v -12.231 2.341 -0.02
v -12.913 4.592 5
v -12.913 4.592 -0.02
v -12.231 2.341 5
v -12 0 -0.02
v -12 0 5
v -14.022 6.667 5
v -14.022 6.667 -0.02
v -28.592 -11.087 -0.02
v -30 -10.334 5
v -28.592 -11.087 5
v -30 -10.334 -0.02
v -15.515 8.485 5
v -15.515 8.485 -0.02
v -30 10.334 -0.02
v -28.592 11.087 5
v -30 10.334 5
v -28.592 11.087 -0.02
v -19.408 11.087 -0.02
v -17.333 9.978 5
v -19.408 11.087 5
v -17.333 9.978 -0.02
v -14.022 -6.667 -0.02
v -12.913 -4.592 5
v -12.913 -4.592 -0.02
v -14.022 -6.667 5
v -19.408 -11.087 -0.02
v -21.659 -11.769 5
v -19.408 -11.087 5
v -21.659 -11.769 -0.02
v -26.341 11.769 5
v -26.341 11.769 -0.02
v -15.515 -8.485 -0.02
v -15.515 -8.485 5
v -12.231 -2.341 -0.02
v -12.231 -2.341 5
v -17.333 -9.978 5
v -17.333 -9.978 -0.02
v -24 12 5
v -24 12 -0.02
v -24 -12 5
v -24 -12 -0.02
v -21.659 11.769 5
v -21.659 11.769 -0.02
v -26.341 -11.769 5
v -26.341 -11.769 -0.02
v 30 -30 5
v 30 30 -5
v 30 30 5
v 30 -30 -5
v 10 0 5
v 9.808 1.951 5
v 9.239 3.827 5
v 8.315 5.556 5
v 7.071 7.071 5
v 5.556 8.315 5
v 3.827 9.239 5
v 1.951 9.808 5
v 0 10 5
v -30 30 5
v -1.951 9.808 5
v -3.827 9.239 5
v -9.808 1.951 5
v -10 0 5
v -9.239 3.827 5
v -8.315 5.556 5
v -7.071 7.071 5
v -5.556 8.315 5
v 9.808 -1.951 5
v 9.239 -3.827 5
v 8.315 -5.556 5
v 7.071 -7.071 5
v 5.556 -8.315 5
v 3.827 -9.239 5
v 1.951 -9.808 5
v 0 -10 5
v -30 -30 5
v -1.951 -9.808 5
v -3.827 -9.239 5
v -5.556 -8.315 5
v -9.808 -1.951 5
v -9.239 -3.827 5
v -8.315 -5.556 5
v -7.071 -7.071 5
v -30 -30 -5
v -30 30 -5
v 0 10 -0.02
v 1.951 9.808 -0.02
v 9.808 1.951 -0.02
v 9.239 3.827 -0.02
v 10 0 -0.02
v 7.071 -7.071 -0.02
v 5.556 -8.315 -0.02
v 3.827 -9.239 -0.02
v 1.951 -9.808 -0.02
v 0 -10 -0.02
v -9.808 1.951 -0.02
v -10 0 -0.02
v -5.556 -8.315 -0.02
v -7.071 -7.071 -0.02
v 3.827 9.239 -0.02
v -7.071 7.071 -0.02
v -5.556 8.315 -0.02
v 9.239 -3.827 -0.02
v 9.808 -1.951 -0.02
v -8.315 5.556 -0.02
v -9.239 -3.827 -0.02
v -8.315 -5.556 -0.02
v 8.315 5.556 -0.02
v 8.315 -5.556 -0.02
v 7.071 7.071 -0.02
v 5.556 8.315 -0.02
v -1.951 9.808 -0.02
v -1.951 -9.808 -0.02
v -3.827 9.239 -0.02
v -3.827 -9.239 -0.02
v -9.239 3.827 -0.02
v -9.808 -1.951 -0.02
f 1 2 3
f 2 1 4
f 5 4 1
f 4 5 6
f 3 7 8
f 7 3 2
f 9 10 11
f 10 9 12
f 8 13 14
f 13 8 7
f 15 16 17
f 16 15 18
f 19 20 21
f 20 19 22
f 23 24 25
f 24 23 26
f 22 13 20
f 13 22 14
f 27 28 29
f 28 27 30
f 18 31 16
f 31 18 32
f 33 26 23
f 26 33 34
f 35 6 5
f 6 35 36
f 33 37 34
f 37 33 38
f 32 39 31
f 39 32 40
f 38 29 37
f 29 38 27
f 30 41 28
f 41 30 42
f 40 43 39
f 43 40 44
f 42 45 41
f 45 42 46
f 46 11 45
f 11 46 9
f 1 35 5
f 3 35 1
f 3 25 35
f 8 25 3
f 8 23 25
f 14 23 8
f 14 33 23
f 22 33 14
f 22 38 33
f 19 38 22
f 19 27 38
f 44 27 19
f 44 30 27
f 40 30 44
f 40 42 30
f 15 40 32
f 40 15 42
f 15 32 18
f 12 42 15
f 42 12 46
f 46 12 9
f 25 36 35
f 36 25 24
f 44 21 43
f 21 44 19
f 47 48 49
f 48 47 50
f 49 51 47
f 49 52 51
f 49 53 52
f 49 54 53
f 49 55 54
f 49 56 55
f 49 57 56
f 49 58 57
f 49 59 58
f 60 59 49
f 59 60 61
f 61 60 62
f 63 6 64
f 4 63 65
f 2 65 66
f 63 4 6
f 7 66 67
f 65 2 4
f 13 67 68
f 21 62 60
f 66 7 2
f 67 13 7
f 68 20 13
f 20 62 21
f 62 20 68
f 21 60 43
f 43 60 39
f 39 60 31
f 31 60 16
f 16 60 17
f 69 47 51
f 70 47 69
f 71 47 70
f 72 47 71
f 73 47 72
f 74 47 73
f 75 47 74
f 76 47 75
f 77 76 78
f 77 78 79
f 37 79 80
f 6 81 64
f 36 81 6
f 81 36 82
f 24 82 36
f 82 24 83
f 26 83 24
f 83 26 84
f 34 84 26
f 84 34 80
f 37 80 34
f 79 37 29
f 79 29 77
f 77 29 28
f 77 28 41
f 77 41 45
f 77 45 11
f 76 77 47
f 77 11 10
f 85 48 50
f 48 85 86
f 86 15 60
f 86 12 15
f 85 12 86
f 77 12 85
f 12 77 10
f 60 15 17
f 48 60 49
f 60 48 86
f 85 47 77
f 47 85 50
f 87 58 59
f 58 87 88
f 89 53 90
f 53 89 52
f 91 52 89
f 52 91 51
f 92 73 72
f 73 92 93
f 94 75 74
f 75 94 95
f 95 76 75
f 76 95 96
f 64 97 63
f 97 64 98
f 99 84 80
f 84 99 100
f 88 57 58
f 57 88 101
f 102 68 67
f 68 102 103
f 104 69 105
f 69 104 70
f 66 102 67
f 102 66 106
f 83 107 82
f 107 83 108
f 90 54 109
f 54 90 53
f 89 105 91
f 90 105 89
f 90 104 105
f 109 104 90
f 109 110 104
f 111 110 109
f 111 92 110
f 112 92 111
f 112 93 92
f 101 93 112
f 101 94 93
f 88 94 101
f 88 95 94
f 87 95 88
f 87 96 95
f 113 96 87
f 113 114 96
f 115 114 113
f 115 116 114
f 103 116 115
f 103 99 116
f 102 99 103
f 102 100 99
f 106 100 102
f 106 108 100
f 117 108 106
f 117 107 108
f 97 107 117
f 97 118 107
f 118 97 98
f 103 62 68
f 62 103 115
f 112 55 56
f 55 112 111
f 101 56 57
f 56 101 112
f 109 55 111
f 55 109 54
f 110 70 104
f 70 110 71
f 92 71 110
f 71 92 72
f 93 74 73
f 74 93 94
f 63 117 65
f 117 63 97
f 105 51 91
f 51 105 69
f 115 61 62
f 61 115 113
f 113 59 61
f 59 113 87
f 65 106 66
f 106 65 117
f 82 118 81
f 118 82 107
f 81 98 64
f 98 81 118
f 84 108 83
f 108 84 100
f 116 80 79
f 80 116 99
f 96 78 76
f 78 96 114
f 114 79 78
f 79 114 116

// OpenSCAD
$fn = 32;
// 60x60x10 фланец с 4 отверстиями М5 по углам.
eps = 0.02;
module chamfer() {
    for (x = -24, 24) {
        translate([x, 0, -eps]) cylinder(d = 24, h = 24);
        translate([x, 0, eps]) cylinder(d = 24, h = 24);
    }
}
difference() {
    cube([60, 60, 10], center = true);
    chamfer();
    translate([0, 0, -eps]) cylinder(d = 20, h = 60 + 2 * eps);
    translate([0, 0, eps]) cylinder(d = 20, h = 60 + 2 * eps);
    translate([0, -eps, -eps]) cylinder(d = 5, h = 60 + 2 * eps);
    translate([0, eps, -eps]) cylinder(d = 5, h = 60 + 2 * eps);
}
